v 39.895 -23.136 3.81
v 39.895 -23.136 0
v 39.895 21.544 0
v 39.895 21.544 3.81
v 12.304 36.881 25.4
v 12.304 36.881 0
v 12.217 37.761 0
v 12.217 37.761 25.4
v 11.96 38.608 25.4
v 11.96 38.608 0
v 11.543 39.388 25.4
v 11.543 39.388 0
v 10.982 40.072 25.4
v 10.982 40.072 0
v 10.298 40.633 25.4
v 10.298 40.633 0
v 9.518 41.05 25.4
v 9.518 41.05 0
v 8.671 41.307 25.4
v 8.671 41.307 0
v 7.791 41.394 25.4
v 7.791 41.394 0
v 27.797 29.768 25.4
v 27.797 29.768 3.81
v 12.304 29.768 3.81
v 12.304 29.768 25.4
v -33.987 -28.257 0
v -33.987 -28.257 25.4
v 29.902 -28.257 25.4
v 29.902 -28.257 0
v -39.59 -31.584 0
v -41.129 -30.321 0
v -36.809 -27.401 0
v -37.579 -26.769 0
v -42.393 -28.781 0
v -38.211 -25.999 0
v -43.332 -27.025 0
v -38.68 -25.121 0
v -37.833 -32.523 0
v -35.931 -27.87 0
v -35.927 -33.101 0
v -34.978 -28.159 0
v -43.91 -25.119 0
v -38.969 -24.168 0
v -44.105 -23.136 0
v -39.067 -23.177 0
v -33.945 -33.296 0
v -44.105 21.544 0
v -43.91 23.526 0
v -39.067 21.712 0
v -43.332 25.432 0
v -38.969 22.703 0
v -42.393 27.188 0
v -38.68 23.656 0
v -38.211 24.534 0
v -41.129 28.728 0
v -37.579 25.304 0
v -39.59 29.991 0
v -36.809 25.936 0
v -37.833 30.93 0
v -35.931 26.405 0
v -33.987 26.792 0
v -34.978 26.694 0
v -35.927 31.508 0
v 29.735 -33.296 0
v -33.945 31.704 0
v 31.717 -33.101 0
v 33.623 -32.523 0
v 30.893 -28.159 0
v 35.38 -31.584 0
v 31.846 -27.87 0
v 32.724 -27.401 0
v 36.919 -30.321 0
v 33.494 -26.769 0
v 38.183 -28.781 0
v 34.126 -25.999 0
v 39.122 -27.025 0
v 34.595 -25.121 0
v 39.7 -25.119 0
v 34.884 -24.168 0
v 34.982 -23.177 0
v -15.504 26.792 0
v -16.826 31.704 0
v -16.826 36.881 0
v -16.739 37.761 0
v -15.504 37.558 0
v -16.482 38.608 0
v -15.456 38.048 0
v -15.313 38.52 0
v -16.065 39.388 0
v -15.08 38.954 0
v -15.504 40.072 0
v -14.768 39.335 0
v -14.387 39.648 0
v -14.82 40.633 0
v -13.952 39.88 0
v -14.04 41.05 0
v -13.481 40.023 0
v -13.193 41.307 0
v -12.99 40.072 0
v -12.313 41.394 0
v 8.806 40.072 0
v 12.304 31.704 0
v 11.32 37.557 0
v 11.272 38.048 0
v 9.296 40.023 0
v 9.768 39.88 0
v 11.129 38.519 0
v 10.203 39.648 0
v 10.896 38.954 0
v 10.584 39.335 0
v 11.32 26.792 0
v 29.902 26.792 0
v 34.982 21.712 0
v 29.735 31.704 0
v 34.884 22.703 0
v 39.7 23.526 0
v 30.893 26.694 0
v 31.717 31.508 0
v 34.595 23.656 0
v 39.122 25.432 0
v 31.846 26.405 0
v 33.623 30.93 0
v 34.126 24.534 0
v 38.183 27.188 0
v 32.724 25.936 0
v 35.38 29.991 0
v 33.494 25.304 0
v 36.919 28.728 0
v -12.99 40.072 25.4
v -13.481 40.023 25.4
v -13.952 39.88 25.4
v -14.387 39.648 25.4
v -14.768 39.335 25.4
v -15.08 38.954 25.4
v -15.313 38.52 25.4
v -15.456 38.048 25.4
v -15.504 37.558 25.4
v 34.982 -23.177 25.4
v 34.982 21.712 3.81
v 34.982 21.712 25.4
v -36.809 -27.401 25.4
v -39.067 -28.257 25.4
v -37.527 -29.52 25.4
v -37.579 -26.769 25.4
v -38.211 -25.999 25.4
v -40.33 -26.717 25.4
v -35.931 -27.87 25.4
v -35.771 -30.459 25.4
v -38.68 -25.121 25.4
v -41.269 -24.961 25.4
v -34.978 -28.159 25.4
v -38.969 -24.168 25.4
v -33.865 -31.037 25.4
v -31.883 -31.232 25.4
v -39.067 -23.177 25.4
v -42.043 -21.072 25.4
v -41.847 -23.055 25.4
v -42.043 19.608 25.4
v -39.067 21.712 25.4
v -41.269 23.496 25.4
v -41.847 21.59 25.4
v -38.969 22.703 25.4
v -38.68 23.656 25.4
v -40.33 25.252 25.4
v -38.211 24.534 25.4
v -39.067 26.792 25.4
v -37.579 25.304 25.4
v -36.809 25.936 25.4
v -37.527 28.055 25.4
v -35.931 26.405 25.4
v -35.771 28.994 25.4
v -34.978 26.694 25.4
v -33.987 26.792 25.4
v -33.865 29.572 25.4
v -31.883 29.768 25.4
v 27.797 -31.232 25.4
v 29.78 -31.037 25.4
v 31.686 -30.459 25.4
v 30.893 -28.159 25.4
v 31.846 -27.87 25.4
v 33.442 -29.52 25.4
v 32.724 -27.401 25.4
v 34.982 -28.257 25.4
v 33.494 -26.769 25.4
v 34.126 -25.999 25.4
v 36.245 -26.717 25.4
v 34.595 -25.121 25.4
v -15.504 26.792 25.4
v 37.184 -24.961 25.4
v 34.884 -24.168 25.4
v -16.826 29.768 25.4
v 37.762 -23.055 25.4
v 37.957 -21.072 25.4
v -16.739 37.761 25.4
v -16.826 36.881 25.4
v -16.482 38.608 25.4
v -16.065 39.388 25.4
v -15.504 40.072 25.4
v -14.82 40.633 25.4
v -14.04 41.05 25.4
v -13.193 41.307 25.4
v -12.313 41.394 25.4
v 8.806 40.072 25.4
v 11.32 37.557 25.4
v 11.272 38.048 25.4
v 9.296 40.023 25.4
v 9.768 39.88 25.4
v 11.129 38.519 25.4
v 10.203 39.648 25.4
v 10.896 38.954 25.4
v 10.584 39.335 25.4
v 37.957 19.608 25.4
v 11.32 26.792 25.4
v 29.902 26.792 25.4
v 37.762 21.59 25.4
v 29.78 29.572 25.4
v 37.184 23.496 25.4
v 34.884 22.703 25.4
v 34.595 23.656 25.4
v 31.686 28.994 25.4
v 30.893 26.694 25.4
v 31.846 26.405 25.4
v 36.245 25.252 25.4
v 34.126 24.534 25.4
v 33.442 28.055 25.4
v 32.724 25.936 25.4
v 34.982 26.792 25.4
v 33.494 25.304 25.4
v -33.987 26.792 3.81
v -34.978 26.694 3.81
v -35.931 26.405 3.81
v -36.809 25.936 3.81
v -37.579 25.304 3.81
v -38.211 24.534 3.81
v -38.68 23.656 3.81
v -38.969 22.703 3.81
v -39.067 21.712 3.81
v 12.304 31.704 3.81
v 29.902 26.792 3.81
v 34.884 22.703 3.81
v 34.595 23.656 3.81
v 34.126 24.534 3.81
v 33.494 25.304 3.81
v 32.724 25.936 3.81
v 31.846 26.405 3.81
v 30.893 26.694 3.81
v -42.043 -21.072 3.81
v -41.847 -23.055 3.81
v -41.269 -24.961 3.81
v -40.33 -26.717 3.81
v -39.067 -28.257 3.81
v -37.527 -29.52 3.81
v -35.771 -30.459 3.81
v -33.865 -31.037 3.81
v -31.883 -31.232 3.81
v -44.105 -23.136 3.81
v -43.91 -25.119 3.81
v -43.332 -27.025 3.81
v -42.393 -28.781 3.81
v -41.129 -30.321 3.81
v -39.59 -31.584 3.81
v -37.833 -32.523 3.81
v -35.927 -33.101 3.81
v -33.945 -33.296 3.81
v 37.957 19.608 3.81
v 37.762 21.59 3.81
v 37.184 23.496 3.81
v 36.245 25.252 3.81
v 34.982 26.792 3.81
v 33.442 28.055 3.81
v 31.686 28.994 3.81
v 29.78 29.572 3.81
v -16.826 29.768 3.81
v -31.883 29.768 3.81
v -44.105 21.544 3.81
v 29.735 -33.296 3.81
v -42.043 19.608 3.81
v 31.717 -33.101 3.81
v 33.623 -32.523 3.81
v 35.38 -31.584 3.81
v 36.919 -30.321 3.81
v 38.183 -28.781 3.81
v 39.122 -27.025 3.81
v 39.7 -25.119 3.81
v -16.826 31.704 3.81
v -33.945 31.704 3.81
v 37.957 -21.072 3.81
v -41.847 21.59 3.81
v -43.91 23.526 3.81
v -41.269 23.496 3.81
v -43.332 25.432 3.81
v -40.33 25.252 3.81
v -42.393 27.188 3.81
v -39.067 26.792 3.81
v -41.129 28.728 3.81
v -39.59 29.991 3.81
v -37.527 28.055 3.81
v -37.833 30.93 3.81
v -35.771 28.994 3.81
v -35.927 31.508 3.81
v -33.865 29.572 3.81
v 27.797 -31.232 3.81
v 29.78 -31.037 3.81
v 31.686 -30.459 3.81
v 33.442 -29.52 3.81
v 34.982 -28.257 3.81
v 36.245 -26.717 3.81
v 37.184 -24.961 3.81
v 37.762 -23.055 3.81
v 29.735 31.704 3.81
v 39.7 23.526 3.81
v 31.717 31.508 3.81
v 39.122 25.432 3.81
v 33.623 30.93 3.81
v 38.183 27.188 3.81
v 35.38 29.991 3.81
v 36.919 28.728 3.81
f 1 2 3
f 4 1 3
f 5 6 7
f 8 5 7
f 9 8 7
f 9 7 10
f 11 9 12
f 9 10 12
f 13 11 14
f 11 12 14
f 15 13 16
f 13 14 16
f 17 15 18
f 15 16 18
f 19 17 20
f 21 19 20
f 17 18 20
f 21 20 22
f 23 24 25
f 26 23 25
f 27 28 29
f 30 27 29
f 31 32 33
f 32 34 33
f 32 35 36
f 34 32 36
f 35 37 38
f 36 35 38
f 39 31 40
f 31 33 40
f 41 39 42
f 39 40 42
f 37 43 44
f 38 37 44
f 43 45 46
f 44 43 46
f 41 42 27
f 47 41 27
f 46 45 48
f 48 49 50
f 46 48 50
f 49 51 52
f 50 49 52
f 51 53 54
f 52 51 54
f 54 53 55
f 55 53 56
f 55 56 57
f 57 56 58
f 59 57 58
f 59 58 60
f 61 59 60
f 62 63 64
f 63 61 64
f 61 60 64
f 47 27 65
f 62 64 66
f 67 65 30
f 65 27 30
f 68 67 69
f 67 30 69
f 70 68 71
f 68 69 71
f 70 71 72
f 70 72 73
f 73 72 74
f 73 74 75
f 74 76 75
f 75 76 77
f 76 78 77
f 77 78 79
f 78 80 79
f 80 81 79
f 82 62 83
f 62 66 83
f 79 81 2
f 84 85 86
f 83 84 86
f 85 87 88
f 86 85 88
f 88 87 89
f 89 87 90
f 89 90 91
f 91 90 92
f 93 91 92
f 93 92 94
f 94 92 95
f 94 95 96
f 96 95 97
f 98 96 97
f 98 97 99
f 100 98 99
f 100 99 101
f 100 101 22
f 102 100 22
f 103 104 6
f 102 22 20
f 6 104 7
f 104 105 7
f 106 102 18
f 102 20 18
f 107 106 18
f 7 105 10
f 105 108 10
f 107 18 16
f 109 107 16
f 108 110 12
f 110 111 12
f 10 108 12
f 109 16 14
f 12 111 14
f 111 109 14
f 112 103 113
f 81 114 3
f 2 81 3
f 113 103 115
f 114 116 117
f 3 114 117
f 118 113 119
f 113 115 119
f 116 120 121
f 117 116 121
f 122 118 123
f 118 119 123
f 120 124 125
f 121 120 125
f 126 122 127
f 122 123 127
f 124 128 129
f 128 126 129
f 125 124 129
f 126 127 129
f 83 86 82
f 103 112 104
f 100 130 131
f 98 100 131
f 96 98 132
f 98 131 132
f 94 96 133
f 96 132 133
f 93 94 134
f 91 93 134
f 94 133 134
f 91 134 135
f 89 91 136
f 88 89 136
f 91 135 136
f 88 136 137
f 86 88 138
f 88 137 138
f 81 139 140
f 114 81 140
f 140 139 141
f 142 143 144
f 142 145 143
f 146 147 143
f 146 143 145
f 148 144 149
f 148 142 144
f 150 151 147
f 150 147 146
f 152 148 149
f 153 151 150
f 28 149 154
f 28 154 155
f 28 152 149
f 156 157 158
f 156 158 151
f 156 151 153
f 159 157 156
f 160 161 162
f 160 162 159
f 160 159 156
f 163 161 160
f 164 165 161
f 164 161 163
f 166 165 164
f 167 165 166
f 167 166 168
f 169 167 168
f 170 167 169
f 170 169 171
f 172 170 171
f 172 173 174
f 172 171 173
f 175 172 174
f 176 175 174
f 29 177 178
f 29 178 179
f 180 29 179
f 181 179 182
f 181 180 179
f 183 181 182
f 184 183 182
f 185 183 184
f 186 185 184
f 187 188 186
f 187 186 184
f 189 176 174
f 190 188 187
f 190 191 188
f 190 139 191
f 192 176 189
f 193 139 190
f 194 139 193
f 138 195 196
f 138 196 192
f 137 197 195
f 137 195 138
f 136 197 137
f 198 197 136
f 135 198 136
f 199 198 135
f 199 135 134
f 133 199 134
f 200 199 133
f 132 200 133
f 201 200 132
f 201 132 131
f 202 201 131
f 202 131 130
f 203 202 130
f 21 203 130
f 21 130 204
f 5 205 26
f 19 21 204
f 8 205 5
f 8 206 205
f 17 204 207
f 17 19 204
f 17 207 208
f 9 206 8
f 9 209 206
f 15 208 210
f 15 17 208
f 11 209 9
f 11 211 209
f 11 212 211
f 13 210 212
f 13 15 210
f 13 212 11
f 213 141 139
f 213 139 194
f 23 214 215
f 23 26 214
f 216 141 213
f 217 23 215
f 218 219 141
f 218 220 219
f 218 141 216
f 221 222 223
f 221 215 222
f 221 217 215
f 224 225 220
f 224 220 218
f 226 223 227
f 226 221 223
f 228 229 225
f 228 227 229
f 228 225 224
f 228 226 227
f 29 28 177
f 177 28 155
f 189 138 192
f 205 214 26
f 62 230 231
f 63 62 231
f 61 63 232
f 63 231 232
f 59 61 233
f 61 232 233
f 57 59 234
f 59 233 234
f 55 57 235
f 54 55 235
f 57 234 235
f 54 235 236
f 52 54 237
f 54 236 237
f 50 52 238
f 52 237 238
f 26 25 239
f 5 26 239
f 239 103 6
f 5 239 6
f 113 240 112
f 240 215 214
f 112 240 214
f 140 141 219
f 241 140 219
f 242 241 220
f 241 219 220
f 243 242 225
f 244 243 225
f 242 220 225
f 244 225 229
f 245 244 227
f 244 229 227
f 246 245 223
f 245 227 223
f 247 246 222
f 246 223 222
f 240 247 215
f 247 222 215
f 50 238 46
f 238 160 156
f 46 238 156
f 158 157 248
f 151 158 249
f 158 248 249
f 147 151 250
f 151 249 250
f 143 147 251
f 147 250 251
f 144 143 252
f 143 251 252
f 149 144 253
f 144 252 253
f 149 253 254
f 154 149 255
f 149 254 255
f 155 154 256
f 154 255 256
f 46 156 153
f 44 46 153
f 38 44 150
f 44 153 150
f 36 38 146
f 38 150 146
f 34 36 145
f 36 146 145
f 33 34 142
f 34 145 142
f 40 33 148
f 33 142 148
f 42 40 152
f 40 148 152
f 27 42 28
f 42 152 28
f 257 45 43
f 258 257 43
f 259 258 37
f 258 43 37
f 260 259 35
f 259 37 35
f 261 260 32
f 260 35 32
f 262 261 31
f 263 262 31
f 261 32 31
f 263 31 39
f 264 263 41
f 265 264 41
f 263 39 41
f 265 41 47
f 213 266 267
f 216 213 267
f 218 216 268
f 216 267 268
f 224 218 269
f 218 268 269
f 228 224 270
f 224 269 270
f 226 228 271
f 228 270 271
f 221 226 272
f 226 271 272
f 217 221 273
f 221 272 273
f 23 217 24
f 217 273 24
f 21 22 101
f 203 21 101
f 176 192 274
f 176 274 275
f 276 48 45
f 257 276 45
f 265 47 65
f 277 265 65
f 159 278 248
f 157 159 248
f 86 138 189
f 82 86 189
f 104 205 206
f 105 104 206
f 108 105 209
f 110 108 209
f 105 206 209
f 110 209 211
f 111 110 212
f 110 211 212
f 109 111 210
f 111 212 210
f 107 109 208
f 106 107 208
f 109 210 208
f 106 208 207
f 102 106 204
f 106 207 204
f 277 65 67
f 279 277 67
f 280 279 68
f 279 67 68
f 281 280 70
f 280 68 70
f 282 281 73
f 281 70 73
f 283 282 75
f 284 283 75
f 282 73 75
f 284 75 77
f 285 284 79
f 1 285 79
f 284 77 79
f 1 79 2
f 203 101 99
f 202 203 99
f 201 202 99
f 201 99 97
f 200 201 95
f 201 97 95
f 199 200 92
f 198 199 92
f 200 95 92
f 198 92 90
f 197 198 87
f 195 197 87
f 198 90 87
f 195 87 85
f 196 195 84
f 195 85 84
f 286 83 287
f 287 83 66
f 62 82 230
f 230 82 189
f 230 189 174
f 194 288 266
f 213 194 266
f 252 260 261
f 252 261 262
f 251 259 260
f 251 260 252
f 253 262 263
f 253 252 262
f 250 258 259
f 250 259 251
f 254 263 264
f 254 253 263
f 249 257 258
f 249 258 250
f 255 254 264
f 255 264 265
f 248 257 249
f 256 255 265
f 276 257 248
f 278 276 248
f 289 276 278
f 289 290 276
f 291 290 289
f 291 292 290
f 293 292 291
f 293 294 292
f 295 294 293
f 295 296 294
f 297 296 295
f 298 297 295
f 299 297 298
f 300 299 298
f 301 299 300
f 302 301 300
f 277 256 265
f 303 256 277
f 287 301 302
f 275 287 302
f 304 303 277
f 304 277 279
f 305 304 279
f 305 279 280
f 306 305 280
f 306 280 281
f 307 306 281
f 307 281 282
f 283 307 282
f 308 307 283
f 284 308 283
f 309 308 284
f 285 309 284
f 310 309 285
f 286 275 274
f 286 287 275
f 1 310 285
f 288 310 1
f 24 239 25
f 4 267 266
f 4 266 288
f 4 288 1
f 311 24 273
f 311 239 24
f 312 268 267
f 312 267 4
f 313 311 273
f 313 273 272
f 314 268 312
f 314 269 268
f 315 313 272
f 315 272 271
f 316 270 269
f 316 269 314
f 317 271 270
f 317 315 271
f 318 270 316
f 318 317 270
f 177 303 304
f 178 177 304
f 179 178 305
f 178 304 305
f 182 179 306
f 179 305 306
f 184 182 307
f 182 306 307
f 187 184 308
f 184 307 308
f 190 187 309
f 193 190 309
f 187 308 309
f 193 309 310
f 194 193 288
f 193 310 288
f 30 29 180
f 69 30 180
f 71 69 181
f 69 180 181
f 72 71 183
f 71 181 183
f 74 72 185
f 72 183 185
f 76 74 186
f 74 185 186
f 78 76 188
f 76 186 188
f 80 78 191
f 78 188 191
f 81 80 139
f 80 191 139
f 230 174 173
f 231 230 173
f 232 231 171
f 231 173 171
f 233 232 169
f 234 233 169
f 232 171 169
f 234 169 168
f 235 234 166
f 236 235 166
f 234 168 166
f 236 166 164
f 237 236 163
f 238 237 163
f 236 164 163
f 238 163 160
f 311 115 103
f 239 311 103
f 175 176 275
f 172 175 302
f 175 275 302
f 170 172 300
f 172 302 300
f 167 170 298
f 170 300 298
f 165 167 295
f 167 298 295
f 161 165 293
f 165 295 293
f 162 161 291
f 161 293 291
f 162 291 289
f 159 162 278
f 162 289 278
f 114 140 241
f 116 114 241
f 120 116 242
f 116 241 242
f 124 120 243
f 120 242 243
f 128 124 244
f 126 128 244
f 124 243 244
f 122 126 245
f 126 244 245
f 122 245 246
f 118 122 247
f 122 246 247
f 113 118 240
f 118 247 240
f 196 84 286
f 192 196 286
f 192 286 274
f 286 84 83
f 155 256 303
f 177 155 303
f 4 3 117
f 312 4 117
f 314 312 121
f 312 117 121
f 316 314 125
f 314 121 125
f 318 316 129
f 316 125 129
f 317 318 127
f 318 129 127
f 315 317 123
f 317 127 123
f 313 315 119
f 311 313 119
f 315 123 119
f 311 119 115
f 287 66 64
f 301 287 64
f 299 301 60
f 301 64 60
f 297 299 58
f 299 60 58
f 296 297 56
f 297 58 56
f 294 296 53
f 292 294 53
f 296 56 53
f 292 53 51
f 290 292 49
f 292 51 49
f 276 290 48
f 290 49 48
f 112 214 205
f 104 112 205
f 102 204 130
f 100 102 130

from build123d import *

# Parameters (mm, degrees)
F2_DEPTH  = 25.4
F4_DEPTH  = 25.4
F5_DEPTH  = 3.81
F6_DEPTH  = 25.4
F8_DEPTH  = 25.4
F10_DEPTH = 25.4


with BuildPart() as f2:
    # F1 (on Top) → F2 (new body)
    with BuildSketch(Plane.XY):
        with BuildLine():
            Line((27.797497, 29.7675), (-31.882503, 29.7675))
            ThreePointArc((-31.882503, 29.7675), (-39.066708, 26.791705), (-42.042503, 19.6075))
            Line((-42.042503, 19.6075), (-42.042503, -21.0725))
            ThreePointArc((-42.042503, -21.0725), (-39.066708, -28.256705), (-31.882503, -31.2325))
            Line((-31.882503, -31.2325), (27.797497, -31.2325))
            ThreePointArc((27.797497, -31.2325), (34.981702, -28.256705), (37.957497, -21.0725))
            Line((37.957497, -21.0725), (37.957497, 19.6075))
            ThreePointArc((37.957497, 19.6075), (34.981702, 26.791705), (27.797497, 29.7675))
        make_face()
    extrude(amount=F2_DEPTH)

    # F3 (on face) → F4 (cut)
    with BuildSketch(Plane.XY.offset(25.4)):
        with BuildLine():
            Line((29.901702, 26.791705), (-33.986708, 26.791705))
            ThreePointArc((-33.986708, 26.791705), (-37.57881, 25.303808), (-39.066708, 21.711705))
            Line((-39.066708, 21.711705), (-39.066708, -23.176705))
            ThreePointArc((-39.066708, -23.176705), (-37.57881, -26.768807), (-33.986708, -28.256705))
            Line((-33.986708, -28.256705), (29.901702, -28.256705))
            ThreePointArc((29.901702, -28.256705), (33.493804, -26.768807), (34.981702, -23.176705))
            Line((34.981702, -23.176705), (34.981702, 21.711705))
            ThreePointArc((34.981702, 21.711705), (33.493804, 25.303808), (29.901702, 26.791705))
        make_face()
    extrude(amount=-F4_DEPTH, mode=Mode.SUBTRACT)

    # F0 (on Top) → F5 (join)
    with BuildSketch(Plane.XY):
        with BuildLine():
            Line((29.734908, 31.703549), (-33.945092, 31.703549))
            ThreePointArc((-33.945092, 31.703549), (-41.129297, 28.727754), (-44.105092, 21.543549))
            Line((-44.105092, 21.543549), (-44.105092, -23.136451))
            ThreePointArc((-44.105092, -23.136451), (-41.129297, -30.320656), (-33.945092, -33.296451))
            Line((-33.945092, -33.296451), (29.734908, -33.296451))
            ThreePointArc((29.734908, -33.296451), (36.919113, -30.320656), (39.894908, -23.136451))
            Line((39.894908, -23.136451), (39.894908, 21.543549))
            ThreePointArc((39.894908, 21.543549), (36.919113, 28.727754), (29.734908, 31.703549))
        make_face()
    extrude(amount=F5_DEPTH)

    # F5_face (on face) → F6 (cut)
    with BuildSketch(Plane(origin=(-2.042503, -0.7325, 3.81), x_dir=(1, 0, 0), z_dir=(0, 0, 1))):
        with BuildLine():
            Line((31.944205, 27.524205), (-31.944205, 27.524205))
            ThreePointArc((-31.944205, 27.524205), (-35.536307, 26.036307), (-37.024205, 22.444205))
            Line((-37.024205, 22.444205), (-37.024205, -22.444205))
            ThreePointArc((-37.024205, -22.444205), (-35.536307, -26.036307), (-31.944205, -27.524205))
            Line((-31.944205, -27.524205), (31.944205, -27.524205))
            ThreePointArc((31.944205, -27.524205), (35.536307, -26.036307), (37.024205, -22.444205))
            Line((37.024205, -22.444205), (37.024205, 22.444205))
            ThreePointArc((37.024205, 22.444205), (35.536307, 26.036307), (31.944205, 27.524205))
        make_face()
    extrude(amount=-F6_DEPTH, mode=Mode.SUBTRACT)

    # F7 (on Top) → F8 (join)
    with BuildSketch(Plane.XY):
        with BuildLine():
            Line((-16.826013, 36.880544), (-16.826013, 26.793541))
            Line((-16.826013, 26.793541), (12.303987, 26.793541))
            Line((12.303987, 26.793541), (12.303987, 36.880544))
            ThreePointArc((12.303987, 36.880544), (10.98216, 40.071715), (7.790989, 41.393541))
            Line((7.790989, 41.393541), (-12.313015, 41.393541))
            ThreePointArc((-12.313015, 41.393541), (-15.504187, 40.071715), (-16.826013, 36.880544))
        make_face()
    extrude(amount=F8_DEPTH)

    # F9 (on face) → F10 (cut)
    with BuildSketch(Plane.XY.offset(25.4)):
        with BuildLine():
            Line((8.805542, 40.071715), (-12.990056, 40.071715))
            ThreePointArc((-12.990056, 40.071715), (-14.767815, 39.335343), (-15.504187, 37.557585))
            Line((-15.504187, 37.557585), (-15.504187, 26.791705))
            Line((-15.504187, 26.791705), (11.320142, 26.791705))
            Line((11.320142, 26.791705), (11.320142, 37.557115))
            ThreePointArc((11.320142, 37.557115), (10.583633, 39.335206), (8.805542, 40.071715))
        make_face()
    extrude(amount=-F10_DEPTH, mode=Mode.SUBTRACT)


solid = f2.part
